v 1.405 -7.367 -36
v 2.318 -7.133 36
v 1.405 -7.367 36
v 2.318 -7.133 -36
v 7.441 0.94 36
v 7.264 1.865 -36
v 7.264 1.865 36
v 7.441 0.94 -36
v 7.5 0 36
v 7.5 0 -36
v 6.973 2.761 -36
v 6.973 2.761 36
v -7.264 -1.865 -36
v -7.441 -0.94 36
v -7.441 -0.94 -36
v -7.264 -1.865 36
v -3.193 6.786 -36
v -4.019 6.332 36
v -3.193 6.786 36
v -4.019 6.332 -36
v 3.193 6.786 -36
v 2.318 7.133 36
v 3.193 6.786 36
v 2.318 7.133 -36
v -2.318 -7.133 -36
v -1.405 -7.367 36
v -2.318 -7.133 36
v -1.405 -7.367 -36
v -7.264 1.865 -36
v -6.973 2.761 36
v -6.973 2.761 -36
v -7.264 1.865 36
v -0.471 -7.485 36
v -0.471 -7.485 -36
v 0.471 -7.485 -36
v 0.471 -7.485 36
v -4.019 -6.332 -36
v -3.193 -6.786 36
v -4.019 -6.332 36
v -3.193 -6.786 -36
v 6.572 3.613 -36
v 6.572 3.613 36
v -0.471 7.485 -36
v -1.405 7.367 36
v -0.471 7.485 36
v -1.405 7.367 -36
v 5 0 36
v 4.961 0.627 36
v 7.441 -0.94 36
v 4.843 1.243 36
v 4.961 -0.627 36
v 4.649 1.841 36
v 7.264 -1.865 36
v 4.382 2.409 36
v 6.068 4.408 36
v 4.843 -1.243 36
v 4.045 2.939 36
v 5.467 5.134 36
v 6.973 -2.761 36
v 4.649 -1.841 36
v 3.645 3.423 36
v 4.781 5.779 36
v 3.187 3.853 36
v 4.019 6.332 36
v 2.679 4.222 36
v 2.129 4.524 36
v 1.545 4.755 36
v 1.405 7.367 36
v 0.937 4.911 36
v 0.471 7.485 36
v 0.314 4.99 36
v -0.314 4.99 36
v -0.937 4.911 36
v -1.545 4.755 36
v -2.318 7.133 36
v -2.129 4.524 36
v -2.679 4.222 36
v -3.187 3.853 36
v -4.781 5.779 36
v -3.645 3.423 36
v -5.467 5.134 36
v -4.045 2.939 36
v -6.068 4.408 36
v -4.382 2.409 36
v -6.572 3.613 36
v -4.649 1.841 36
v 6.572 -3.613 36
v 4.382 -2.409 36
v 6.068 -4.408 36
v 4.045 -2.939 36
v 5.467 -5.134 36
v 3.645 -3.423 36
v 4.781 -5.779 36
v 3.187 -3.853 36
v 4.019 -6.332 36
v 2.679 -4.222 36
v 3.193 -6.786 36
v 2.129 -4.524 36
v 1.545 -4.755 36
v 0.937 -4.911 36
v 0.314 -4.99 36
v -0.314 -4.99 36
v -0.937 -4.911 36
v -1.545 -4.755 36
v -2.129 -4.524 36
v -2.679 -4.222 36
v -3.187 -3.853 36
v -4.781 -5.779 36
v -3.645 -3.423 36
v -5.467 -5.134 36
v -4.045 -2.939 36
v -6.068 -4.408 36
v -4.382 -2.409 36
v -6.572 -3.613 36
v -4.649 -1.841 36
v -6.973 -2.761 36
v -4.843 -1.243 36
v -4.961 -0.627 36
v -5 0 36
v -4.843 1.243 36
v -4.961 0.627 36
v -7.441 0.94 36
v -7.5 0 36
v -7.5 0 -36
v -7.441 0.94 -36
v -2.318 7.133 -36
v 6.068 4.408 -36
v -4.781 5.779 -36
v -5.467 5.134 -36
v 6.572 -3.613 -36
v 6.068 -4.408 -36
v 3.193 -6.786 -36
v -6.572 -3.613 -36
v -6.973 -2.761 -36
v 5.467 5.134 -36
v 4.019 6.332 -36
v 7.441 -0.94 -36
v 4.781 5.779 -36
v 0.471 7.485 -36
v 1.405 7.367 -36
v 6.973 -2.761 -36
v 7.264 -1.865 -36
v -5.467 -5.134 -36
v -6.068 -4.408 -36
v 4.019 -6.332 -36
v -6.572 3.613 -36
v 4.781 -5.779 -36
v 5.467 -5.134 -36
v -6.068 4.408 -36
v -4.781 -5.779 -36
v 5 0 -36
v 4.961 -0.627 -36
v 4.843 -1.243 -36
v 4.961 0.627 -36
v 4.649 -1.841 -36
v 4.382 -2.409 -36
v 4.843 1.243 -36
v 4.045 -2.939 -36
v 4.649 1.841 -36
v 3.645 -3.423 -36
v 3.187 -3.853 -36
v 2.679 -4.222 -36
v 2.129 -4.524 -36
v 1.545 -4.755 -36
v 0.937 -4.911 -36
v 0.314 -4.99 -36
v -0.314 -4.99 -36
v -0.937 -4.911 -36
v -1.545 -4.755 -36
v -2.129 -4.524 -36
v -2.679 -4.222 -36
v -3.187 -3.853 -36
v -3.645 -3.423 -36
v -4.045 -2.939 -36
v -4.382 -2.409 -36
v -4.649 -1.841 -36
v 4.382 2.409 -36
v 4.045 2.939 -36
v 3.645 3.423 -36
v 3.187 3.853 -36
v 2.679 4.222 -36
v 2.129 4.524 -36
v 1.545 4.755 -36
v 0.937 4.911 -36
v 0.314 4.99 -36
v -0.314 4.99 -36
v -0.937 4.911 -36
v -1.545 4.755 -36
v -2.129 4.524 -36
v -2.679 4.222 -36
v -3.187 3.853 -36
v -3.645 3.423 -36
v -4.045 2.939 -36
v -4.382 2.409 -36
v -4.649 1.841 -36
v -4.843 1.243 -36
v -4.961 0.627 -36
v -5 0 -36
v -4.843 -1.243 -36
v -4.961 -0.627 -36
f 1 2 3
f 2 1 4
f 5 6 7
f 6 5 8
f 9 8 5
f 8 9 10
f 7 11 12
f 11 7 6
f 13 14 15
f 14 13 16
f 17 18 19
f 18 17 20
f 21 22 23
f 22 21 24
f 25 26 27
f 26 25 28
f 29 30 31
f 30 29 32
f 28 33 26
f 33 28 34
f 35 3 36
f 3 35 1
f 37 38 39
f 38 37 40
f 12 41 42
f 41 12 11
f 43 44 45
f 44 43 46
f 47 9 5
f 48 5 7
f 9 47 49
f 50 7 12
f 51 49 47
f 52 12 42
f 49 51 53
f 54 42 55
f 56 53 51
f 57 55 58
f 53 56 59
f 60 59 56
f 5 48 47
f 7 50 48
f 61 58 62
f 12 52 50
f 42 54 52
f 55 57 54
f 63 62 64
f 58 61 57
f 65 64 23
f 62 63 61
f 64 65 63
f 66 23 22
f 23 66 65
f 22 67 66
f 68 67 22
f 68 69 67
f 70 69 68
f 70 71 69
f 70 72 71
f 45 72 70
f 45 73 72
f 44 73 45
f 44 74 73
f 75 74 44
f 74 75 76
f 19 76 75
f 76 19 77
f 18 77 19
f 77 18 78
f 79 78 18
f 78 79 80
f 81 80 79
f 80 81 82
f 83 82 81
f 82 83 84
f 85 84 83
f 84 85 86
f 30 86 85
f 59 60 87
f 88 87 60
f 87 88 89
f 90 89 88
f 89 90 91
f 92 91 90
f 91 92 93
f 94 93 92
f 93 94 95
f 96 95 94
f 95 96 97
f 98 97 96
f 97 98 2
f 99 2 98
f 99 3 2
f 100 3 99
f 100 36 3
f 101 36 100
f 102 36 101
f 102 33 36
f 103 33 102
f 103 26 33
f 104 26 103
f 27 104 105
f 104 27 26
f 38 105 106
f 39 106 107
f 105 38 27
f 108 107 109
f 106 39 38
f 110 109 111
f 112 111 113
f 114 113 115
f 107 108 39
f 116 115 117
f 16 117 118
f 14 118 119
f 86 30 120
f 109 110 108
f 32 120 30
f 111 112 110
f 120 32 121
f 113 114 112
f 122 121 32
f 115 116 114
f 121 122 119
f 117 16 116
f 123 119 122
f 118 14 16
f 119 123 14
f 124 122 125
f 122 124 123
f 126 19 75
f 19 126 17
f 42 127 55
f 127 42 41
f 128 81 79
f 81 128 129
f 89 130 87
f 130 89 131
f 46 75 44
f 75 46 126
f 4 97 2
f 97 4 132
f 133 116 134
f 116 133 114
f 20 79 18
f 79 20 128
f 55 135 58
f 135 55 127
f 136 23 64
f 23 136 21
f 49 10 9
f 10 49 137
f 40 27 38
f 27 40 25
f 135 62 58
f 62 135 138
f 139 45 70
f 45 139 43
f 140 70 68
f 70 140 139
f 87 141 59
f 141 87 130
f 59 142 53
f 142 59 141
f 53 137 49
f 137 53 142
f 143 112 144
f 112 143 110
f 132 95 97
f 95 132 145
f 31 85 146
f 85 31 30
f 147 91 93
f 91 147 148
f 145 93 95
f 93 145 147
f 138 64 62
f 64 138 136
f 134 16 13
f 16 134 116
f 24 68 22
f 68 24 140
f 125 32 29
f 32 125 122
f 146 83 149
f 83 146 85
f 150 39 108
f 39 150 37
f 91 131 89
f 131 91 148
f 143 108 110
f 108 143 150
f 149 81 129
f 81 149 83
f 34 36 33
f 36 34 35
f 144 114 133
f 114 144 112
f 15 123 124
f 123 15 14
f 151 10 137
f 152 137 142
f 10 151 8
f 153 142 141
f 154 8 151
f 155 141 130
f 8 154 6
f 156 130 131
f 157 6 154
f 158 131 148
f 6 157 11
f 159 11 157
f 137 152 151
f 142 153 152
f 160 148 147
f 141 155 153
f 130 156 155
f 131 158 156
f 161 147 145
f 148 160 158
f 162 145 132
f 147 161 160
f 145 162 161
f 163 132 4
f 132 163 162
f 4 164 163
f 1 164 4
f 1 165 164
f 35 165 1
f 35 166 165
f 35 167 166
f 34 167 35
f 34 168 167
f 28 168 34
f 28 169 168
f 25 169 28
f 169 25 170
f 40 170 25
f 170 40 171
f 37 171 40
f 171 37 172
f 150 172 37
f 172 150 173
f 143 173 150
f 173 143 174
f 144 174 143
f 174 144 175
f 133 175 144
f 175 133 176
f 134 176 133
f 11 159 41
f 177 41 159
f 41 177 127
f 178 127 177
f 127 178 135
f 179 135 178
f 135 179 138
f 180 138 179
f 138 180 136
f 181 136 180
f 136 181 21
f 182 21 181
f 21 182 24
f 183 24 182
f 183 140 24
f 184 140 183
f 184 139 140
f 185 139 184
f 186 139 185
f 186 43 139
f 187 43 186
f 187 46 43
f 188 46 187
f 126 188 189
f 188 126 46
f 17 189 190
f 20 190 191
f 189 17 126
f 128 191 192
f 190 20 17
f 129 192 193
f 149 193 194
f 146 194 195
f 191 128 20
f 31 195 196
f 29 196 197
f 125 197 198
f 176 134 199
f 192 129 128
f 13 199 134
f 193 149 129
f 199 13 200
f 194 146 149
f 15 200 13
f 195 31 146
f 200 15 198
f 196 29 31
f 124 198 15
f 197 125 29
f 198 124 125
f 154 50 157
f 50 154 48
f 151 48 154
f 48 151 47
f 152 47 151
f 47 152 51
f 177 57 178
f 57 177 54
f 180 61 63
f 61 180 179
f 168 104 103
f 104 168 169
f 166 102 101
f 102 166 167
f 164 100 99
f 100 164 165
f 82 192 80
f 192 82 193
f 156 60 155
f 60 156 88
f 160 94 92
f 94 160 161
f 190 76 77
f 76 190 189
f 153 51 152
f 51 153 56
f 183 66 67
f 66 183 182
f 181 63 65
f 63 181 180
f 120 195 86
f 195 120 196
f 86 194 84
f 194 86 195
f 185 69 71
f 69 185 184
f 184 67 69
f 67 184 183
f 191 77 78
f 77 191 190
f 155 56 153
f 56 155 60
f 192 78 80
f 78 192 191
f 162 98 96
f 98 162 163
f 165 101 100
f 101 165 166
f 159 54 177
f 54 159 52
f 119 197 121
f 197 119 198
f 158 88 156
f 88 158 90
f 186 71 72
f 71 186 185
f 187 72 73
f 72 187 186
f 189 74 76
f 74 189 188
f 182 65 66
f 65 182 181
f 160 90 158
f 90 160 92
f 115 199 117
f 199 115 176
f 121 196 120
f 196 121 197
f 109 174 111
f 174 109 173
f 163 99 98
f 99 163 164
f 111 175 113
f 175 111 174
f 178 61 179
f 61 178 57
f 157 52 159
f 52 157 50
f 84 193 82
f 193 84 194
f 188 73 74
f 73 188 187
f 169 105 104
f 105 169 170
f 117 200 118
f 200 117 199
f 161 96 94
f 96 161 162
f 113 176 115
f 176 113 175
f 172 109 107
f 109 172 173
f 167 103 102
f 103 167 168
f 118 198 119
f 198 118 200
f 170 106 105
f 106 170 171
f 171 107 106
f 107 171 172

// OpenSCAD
$fn = 50;


difference() {
	union() {
		translate(v = [0, 0, -36.0000000000]) {
			cylinder(h = 72, r = 7.5000000000);
		}
	}
	union() {
		translate(v = [0, 0, -100.0000000000]) {
			cylinder(h = 200, r = 5.0000000000);
		}
	}
}
